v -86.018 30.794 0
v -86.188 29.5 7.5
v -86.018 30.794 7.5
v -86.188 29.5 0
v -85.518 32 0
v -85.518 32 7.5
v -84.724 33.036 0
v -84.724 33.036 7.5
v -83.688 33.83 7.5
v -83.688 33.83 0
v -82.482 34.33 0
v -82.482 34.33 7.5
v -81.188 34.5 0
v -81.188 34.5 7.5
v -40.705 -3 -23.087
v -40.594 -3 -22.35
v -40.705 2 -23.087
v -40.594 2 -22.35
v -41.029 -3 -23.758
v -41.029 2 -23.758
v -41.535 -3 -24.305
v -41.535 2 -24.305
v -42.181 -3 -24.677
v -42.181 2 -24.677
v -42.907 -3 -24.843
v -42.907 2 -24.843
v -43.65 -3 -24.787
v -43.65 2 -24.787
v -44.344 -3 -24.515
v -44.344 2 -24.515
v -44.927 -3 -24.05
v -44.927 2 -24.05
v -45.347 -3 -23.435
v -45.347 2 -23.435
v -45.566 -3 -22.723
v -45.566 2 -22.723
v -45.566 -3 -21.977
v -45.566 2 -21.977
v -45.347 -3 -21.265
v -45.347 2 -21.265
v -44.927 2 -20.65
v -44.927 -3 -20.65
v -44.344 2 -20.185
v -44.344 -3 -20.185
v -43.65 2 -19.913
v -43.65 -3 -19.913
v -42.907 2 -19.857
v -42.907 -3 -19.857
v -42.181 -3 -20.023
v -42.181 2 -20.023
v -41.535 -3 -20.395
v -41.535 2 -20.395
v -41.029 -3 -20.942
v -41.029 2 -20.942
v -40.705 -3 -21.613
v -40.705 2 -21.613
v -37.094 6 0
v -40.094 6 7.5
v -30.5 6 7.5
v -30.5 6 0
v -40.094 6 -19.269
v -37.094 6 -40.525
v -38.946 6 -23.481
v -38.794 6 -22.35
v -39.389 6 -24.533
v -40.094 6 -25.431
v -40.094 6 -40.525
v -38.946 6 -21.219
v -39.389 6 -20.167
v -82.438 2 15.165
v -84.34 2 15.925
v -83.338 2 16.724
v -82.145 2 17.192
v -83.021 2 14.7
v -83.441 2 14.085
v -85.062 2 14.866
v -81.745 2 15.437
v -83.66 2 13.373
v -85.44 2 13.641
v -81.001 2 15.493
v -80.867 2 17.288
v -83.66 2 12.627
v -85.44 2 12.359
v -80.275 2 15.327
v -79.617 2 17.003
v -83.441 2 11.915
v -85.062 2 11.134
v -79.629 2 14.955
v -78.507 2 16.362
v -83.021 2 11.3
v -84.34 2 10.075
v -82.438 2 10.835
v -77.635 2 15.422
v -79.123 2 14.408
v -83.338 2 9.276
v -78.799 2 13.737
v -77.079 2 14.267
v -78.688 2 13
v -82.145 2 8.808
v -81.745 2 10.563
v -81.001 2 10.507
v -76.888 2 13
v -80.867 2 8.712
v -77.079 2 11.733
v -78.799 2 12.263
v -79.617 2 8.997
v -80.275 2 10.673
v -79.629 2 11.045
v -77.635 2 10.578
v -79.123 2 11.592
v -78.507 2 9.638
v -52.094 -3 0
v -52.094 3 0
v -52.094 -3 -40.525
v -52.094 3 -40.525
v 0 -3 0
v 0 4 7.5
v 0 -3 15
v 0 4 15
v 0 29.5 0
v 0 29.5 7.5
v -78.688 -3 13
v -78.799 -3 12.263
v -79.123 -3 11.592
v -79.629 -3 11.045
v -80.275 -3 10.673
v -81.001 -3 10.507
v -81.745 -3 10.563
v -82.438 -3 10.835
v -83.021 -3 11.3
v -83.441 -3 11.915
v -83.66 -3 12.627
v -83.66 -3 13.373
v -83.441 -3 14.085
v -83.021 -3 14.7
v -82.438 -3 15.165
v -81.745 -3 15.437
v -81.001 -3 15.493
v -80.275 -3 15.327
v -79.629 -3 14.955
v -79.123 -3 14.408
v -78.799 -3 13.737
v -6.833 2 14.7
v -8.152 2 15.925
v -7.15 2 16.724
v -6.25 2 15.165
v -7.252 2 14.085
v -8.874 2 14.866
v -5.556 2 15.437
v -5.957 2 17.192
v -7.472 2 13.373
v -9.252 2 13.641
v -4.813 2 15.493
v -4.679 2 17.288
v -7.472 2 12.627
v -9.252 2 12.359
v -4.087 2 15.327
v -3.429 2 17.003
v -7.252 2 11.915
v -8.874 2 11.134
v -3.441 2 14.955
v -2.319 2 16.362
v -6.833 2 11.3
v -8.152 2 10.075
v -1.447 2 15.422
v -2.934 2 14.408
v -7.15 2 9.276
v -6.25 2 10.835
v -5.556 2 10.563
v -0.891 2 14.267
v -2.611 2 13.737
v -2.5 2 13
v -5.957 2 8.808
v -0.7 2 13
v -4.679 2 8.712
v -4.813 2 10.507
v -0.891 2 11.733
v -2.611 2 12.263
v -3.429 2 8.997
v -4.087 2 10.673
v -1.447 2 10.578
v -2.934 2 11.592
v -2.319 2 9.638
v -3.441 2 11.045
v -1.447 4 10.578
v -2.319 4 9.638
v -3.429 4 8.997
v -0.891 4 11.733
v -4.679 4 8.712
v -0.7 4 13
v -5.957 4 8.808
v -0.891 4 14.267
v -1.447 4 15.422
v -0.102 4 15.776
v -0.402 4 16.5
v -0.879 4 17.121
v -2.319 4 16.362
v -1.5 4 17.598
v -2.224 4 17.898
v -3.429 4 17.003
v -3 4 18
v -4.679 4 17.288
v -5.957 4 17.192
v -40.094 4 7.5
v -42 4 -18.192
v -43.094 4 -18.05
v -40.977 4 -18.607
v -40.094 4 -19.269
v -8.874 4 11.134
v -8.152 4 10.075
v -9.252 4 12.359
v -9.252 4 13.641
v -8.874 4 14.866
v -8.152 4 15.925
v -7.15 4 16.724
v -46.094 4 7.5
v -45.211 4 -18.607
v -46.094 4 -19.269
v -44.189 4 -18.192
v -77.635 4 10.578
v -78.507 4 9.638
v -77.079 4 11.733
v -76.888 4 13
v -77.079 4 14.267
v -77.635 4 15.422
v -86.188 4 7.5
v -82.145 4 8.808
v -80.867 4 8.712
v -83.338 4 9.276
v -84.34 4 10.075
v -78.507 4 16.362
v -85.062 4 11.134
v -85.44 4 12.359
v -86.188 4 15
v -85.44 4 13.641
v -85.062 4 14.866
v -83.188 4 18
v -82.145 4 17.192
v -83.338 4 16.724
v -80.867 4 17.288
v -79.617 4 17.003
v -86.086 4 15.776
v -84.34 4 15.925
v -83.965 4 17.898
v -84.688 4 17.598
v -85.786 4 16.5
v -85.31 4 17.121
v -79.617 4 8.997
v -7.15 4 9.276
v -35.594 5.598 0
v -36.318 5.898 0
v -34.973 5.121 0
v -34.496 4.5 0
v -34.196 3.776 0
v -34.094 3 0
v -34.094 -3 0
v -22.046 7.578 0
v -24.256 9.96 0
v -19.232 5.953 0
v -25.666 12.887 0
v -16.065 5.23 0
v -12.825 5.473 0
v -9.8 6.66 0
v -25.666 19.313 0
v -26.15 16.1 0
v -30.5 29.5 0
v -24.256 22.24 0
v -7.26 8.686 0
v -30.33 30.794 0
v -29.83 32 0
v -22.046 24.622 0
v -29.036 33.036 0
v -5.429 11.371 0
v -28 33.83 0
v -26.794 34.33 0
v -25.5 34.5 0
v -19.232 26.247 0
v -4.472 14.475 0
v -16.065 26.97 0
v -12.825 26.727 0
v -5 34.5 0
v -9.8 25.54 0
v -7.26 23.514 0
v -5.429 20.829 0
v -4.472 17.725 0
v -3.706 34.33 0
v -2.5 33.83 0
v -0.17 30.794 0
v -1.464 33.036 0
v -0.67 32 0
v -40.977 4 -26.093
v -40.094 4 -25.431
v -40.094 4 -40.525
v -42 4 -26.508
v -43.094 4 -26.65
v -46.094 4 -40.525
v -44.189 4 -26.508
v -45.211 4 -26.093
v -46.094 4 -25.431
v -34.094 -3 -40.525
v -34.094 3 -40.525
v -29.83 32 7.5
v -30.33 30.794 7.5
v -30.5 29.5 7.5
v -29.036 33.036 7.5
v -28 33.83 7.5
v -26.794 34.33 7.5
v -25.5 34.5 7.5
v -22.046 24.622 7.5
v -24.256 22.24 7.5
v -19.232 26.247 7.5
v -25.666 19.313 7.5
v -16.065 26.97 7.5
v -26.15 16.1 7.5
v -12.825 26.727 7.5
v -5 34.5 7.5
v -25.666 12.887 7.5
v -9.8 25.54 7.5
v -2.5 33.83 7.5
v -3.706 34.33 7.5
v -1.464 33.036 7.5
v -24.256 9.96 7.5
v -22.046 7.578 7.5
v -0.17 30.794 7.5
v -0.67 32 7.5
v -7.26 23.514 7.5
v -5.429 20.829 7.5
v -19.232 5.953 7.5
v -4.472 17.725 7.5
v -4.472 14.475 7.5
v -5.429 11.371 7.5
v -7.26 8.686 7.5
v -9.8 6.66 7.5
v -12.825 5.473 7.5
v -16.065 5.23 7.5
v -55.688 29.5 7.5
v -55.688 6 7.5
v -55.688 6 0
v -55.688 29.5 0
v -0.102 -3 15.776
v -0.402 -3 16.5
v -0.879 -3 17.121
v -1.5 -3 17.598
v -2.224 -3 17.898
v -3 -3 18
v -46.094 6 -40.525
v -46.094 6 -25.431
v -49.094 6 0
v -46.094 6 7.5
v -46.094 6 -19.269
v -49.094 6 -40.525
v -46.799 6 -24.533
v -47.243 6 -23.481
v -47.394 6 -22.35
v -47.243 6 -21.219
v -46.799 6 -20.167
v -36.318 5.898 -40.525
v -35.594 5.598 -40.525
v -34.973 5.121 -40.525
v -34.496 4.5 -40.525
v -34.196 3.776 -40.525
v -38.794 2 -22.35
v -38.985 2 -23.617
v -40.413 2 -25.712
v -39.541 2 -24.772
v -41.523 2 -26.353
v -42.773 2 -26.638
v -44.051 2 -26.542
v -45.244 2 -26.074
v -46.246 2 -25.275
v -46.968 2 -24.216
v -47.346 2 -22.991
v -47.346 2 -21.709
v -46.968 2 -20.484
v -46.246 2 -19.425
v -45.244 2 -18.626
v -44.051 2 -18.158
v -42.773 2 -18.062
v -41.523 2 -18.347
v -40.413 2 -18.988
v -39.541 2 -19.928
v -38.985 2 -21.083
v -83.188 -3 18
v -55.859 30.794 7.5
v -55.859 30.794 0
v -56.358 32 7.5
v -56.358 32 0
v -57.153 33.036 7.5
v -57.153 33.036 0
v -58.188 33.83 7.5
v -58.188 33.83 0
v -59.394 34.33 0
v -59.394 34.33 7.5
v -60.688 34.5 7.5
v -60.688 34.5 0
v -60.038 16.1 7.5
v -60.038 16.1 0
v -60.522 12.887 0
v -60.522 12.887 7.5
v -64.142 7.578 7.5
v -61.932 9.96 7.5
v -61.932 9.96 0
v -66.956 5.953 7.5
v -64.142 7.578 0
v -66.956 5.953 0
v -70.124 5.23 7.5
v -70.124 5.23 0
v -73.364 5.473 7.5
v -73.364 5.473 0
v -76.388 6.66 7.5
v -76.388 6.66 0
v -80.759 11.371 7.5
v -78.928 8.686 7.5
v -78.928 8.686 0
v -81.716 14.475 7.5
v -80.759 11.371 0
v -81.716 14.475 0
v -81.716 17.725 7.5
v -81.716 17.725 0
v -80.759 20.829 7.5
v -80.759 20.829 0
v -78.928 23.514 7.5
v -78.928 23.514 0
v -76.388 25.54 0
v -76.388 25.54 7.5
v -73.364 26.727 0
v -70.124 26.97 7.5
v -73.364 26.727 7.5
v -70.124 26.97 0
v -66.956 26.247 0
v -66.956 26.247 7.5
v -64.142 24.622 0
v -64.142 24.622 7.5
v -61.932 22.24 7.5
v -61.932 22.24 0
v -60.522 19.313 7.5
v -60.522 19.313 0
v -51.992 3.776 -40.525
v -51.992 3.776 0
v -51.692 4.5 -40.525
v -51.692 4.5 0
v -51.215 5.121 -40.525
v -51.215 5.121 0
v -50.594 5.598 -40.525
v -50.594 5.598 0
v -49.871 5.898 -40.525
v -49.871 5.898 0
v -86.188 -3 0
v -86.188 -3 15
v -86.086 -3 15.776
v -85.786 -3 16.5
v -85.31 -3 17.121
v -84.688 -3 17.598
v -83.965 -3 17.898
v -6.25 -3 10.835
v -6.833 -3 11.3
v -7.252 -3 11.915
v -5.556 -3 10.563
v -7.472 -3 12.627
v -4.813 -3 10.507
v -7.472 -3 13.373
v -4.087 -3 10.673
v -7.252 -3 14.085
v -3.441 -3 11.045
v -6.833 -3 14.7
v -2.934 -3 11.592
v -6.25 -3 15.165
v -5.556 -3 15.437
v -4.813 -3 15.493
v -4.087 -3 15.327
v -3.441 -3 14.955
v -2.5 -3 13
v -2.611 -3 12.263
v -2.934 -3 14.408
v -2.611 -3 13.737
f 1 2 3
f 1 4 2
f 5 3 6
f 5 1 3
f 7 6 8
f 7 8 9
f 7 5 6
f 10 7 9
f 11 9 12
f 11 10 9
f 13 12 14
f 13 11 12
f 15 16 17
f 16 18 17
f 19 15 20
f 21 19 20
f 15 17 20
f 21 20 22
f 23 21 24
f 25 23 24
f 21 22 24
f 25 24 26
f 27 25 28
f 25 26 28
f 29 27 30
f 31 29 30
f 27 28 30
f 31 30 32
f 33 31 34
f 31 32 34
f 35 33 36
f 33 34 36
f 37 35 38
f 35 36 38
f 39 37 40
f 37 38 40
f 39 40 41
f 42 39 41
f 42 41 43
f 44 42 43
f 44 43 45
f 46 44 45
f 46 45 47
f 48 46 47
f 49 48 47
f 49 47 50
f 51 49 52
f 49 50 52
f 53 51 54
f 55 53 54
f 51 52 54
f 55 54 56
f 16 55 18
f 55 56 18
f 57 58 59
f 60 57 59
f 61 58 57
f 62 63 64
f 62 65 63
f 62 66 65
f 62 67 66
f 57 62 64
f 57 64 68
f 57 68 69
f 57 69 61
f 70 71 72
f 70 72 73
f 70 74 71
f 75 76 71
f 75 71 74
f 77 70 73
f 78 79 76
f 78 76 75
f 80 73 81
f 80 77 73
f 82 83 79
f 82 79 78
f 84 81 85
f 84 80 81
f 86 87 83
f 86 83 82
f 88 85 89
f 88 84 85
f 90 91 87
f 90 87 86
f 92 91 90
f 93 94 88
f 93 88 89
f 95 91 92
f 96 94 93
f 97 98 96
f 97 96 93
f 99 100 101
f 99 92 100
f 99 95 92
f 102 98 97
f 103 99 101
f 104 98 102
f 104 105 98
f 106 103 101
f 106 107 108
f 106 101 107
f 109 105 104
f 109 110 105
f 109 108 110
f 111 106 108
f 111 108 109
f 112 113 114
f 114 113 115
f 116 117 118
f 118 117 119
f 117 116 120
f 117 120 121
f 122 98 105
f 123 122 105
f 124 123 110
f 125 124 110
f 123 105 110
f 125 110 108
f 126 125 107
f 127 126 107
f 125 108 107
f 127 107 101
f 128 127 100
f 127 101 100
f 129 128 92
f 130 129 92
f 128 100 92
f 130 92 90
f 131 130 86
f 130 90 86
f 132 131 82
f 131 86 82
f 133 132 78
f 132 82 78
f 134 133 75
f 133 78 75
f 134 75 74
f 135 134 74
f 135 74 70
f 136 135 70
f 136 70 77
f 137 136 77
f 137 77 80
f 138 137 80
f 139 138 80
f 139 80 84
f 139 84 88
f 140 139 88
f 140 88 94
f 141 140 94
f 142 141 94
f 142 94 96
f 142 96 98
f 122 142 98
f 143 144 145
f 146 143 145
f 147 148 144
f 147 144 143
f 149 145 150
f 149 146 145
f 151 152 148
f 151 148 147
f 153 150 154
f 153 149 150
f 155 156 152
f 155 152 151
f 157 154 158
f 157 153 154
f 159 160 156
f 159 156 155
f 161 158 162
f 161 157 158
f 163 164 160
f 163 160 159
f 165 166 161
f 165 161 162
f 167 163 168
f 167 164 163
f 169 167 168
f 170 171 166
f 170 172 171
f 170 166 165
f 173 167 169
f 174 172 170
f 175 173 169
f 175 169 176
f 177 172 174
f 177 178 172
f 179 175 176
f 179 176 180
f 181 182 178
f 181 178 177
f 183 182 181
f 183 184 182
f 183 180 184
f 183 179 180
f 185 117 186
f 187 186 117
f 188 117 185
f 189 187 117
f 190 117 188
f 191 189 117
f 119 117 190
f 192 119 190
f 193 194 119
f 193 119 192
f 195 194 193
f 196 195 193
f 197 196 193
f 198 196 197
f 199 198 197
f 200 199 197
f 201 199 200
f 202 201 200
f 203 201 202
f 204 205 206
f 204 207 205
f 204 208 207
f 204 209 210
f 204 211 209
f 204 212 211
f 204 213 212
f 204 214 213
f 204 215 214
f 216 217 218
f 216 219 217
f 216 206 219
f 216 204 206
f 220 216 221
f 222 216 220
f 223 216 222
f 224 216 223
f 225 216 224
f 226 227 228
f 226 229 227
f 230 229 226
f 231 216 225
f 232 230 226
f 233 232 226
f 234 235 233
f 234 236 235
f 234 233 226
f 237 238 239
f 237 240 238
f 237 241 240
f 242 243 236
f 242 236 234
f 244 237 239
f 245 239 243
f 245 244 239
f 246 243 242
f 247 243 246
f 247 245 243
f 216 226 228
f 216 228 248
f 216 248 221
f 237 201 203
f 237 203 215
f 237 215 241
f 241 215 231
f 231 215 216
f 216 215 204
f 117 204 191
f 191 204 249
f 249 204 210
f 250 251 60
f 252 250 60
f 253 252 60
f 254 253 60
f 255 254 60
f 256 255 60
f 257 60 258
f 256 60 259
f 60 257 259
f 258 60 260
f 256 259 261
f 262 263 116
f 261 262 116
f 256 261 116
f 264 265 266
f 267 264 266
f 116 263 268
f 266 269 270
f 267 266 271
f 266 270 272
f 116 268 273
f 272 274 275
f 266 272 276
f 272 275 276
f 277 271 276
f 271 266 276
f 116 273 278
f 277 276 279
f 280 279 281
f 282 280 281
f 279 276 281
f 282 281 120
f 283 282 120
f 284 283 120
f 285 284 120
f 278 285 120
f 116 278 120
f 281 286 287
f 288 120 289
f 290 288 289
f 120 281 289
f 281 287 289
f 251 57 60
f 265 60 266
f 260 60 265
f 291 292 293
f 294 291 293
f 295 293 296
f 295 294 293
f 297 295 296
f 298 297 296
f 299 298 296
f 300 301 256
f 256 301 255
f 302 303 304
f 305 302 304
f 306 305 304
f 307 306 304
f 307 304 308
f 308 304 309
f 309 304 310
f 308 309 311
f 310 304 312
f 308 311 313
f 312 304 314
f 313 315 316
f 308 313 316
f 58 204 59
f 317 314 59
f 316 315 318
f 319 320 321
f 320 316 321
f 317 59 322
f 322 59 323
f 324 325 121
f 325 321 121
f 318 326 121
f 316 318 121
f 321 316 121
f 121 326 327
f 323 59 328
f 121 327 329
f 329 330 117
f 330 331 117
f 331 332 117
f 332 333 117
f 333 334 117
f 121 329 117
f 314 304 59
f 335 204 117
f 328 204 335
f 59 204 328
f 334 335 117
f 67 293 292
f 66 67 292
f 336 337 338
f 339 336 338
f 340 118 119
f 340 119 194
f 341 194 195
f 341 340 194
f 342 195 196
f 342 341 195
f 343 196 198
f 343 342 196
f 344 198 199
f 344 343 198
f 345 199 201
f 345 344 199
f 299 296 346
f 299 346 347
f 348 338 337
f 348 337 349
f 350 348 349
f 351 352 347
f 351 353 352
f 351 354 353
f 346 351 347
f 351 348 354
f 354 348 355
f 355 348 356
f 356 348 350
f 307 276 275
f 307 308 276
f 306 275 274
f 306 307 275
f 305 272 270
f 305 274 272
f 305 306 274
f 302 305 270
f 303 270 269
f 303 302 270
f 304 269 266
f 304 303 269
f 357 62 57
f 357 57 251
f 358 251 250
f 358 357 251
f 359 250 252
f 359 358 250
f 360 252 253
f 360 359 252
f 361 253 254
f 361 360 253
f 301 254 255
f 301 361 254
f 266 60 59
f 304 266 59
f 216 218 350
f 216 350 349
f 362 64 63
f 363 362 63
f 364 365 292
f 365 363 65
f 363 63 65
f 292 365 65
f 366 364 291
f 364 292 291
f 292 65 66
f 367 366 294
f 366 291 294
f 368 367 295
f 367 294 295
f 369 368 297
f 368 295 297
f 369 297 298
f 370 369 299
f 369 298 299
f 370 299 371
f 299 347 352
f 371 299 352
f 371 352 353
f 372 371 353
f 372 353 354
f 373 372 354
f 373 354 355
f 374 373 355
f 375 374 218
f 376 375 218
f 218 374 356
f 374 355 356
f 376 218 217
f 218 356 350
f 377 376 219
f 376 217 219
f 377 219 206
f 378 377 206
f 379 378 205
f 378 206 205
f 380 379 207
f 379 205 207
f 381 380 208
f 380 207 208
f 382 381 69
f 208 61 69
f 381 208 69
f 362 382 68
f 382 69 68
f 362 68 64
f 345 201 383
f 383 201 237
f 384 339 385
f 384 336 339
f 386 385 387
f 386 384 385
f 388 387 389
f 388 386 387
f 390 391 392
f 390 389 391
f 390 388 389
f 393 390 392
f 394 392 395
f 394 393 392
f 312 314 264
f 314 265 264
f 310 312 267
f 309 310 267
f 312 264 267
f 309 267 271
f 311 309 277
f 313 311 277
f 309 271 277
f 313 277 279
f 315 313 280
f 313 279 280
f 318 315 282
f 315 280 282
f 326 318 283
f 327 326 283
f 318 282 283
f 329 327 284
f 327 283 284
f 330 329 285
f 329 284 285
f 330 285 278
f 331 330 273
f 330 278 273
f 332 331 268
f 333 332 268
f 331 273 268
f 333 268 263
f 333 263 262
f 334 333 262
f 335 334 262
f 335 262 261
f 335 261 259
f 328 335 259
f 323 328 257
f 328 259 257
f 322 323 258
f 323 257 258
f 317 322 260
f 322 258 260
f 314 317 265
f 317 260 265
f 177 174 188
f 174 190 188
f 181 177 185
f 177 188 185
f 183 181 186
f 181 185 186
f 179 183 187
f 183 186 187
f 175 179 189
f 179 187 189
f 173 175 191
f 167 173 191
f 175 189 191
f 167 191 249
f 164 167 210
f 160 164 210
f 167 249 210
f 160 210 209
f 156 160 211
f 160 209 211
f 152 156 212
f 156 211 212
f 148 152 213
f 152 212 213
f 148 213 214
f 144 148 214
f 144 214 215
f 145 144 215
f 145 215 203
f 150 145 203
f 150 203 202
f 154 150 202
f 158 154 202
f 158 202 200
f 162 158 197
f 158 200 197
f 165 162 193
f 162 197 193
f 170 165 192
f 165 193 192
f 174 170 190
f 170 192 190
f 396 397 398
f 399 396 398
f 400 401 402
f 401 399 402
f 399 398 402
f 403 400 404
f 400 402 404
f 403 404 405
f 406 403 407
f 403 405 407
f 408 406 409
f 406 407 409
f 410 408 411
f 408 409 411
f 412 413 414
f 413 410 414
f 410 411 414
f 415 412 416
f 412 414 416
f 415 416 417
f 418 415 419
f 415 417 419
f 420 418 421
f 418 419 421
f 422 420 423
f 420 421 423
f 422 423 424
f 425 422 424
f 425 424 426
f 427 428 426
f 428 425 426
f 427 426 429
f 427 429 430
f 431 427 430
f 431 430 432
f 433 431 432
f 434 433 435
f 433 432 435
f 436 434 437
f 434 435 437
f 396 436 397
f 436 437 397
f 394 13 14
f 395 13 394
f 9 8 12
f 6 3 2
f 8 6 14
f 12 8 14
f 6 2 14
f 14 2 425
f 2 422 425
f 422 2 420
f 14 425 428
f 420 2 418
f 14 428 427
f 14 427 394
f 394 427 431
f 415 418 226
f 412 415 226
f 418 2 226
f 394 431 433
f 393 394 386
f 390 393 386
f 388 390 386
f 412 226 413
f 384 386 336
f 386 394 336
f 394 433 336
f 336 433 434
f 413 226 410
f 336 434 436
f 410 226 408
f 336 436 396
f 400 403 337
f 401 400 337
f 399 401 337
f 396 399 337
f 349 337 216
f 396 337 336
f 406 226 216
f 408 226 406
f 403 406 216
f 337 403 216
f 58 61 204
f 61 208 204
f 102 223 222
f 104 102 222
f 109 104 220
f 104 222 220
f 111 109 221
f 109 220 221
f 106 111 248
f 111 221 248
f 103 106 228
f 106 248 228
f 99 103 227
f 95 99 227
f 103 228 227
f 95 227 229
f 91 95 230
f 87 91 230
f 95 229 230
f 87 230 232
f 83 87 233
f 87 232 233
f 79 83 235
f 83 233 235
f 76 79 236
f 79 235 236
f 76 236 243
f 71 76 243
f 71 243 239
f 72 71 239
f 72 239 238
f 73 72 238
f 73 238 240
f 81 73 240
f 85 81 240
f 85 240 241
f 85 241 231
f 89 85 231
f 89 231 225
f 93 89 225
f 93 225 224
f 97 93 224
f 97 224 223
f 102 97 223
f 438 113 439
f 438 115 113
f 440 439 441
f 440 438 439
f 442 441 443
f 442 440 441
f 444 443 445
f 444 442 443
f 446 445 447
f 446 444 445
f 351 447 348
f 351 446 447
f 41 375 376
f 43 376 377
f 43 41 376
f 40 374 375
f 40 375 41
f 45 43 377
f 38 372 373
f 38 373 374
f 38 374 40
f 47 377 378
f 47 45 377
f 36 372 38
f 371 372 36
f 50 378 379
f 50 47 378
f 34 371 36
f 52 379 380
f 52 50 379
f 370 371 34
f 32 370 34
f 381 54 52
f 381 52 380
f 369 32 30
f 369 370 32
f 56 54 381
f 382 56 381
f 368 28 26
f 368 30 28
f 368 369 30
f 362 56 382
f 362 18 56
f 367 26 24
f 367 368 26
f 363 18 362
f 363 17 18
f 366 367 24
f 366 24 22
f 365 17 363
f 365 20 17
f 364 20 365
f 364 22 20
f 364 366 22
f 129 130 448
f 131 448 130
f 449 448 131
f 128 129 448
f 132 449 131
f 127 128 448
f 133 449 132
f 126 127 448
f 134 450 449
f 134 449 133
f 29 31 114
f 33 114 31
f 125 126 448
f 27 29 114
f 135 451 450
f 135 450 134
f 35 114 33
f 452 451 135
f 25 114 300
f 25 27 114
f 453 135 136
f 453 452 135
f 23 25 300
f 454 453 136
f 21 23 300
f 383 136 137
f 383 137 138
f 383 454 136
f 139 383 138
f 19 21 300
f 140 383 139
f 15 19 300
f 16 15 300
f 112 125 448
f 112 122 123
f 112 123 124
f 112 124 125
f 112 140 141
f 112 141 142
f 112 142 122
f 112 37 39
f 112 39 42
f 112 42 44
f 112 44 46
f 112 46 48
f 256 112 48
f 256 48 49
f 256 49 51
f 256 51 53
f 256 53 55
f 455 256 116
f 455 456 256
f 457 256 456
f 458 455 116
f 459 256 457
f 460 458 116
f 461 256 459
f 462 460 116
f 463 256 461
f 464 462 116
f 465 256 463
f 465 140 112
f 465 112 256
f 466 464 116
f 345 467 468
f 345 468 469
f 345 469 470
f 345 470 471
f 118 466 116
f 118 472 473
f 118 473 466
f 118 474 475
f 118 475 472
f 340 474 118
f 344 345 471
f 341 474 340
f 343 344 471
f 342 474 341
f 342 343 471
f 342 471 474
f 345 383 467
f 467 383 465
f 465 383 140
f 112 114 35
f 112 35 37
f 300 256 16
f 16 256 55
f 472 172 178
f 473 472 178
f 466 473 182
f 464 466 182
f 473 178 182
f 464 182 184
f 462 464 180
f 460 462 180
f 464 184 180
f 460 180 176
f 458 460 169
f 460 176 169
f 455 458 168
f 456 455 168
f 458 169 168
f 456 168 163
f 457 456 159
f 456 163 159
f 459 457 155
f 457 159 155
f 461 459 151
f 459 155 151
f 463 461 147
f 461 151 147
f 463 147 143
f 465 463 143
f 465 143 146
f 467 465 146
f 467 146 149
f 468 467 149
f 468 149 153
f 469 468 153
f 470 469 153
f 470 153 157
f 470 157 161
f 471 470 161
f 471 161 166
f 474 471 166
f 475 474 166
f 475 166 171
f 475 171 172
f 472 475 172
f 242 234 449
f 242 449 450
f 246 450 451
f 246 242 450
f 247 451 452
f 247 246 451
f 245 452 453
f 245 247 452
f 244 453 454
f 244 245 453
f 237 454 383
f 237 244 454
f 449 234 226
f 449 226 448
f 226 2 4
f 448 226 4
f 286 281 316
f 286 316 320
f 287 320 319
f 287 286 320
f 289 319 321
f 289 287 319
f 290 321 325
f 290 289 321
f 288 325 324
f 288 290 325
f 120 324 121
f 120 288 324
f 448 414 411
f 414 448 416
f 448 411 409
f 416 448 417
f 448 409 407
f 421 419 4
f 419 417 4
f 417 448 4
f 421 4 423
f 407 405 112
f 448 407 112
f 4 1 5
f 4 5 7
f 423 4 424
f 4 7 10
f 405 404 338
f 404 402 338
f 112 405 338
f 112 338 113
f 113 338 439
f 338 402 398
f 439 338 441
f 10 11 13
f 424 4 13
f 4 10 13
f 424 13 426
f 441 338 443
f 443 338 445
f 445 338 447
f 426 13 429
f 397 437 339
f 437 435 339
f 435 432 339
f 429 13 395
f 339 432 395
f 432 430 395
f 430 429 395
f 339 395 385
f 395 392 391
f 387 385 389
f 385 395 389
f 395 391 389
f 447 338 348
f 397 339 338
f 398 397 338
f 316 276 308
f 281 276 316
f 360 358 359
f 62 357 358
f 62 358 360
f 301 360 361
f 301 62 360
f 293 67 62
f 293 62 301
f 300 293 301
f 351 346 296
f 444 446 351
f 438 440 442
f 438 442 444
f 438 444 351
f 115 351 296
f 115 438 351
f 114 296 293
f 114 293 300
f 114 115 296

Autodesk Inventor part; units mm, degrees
ref_plane "YZ Plane" through (0, 0, 0) normal (1, 0, 0) x (0, 1, 0)
ref_plane "XZ Plane" through (0, 0, 0) normal (0, 1, 0) x (-1, 0, 0)
sketch "Boceto1" plane through (0, 0, 0) normal (0, 1, 0) x (-1, 0, 0)
  line L0 (0, 0) -> (0, 18)
  line L1 (0, 18) -> (43.0941, 18)
  line L2 (43.0941, 18) -> (43.0941, -103.05)
  line L3 (43.0941, -103.05) -> (0, -103.05)
  line L4 (0, -103.05) -> (0, -81.05)
  line L5 (0, -81.05) -> (34.0941, -81.05)
  line L6 (34.0941, -81.05) -> (34.0941, 0)
  line L7 (34.0941, 0) -> (0, 0)
  dimension "acople_hombro_largo_agujero" = 81.05
  dimension "d1" = 9
  dimension "acople_hombro_grosor_trasero" = 18
  dimension "acople_hombro_ancho_agujero" = 34.0941
  dimension "acople_hombro_grosor_frontal" = 22
extrude "Extrusión1" add sketch "Boceto1" along normal blind 4
sketch "Boceto2" plane through (0, 4, 0) normal (0, 1, 0) x (1, 0, 0)
  line L0 (0, -18) -> (0, 0) projected
  line L1 (0, 0) -> (-30.5, 0)
  line L2 (-30.5, 0) -> (-30.5, -7.5)
  line L3 (-30.5, -7.5) -> (0, -7.5)
  line L4 (0, -7.5) -> (0, 0)
  point P0 (0, 81.05)
  dimension "d6" = 30.5
  dimension "grosor_seccion_agujero_circular" = 7.5
sketch "Boceto3" plane through (0, 4, 0) normal (0, 1, 0) x (1, 0, 0)
  line L0 (0, 81.05) -> (-30.5, 81.05)
  line L1 (-30.5, 81.05) -> (-30.5, 96.05)
  line L2 (-30.5, 96.05) -> (0, 96.05)
  line L3 (0, 96.05) -> (0, 81.05)
  line L4 (-30.5, 0) -> (-30.5, -7.5) projected
  point P0 (0, 0)
  dimension "grosor_sección_agujero_servo" = 15
  dimension "d21" = 30.5
extrude "Extrusión2" add sketch "Boceto3" along normal blind 50.5
sketch "Boceto4" plane through (-34.0941, 0, -81.05) normal (0, 0, 1) x (1, 0, 0)
  line L0 (8.5941, 46.5) -> (29.0941, 46.5)
  line L1 (29.0941, 46.5) -> (29.0941, 6)
  line L2 (29.0941, 6) -> (8.5941, 6)
  line L3 (8.5941, 6) -> (8.5941, 46.5)
  line L4 (34.0941, 0) -> (0, 0) projected
  line L5 (34.0941, 0) -> (34.0941, 54.5) projected
  line L6 (3.5941, 54.5) -> (34.0941, 54.5) projected
  line L7 (3.5941, 4) -> (3.5941, 54.5) projected
  line L8 (0, 0) -> (0, 4) projected
  circle A0 centre (13.5941, 2.05) radius 1
  circle A1 centre (24.0941, 2.05) radius 1
  circle A2 centre (13.5941, 50.45) radius 1
  circle A3 centre (24.0941, 50.45) radius 1
  line L9 (0, 4) -> (3.5941, 4) projected
  point P0 (34.0941, 0)
  dimension "d12" = 40.5
  dimension "d13" = 20.5
  dimension "d14" = 2
  dimension "d15" = 3.95
  dimension "d16" = 3.95
  dimension "d17" = 5
  dimension "d18" = 5
  dimension "d19" = 2.05
  dimension "d20" = 5
  dimension "d22" = 30.5
  dimension "d23" = 54.5
  dimension "d24" = 48.4
sketch "Boceto5" plane through (-34.0941, 0, -81.05) normal (0, 0, 1) x (1, 0, 0)
  circle A0 centre (13.5941, 50.45) radius 1 projected
  circle A1 centre (24.0941, 50.45) radius 1 projected
  circle A2 centre (13.5941, 2.05) radius 1 projected
  circle A3 centre (24.0941, 2.05) radius 1 projected
  point P0 (34.0941, 0)
extrude "Extrusión3" cut sketch "Boceto4" against normal up to surface (15 mm away) contours L0 L1 L2 L3
extrude "Extrusión4" cut sketch "Boceto5" against normal up to surface (15 mm away)
extrude "Extrusión5" add sketch "Boceto2" along normal blind 30.5
ref_plane "Plano de trabajo2" through (-25.5, 6, -88.55) normal (0, 1, 0) x (1, 0, 0)
sketch "Boceto6" plane through (0, 0, 0) normal (0, 0, -1) x (-1, 0, 0)
  circle A0 centre (15.25, 16.1) radius 10.9
  line L0 (0, 34.5) -> (30.5, 34.5) projected
  point P0 (0, 0)
  point P1 (0, 6)
  point P2 (15.25, 34.5)
  dimension "d31" = 10.1
  dimension "d32" = 21.8
extrude "Extrusión6" cut sketch "Boceto6" against normal up to surface (7.5 mm away)
sketch "Boceto7" plane through (0, 4, -96.05) normal (0, 0, -1) x (-1, 0, 0)
  line L0 (0, 0) -> (43.0941, 0) projected
  line L1 (30.5, 0) -> (30.5, 50.5) projected
  line L2 (0, 0) -> (30.5, 0)
  line L3 (30.5, 0) -> (30.5, 2)
  line L4 (30.5, 2) -> (0, 2)
  line L5 (0, 2) -> (0, 0)
  line L6 (25.5, 2) -> (5, 2) projected
  point P0 (0, -4)
extrude "Extrusión7" add sketch "Boceto7" along normal up to surface (7 mm away)
sketch "Sketch13" plane through (0, 0, 0) normal (0, -1, 0) x (1, 0, 0)
  line L0 (0, 0) -> (0, 18) projected
  line L1 (0, 18) -> (-43.0941, 18) projected
  line L2 (-43.0941, 18) -> (-43.0941, -103.05) projected
  line L3 (-43.0941, -103.05) -> (0, -103.05) projected
  line L4 (0, -103.05) -> (0, -81.05) projected
  line L5 (0, -81.05) -> (-34.0941, -81.05) projected
  line L6 (-34.0941, -81.05) -> (-34.0941, 0) projected
  line L7 (-34.0941, 0) -> (0, 0) projected
extrude "Extrusion14" add sketch "Sketch13" along normal blind 3
mirror "Mirror2" about plane through (-43.0941, 0, -103.05) normal (-1, 0, 0) of "Extrusión1", "Extrusión2", "Extrusión3", "Extrusión4", "Extrusión5", "Extrusión6", "Extrusión7", "Extrusion14"
sketch "Sketch14" plane through (0, 4, 0) normal (0, 1, 0) x (1, 0, 0)
  line L0 (-30.5, 96.05) -> (-30.5, 103.05) projected
  line L1 (-30.5, 81.05) -> (-30.5, 103.05)
  line L2 (-55.6882, 96.05) -> (-55.6882, 103.05) projected
  line L3 (-30.5, 103.05) -> (-55.6882, 103.05)
  line L4 (-55.6882, 103.05) -> (-55.6882, 81.05)
  line L5 (-86.1882, 81.05) -> (-52.0941, 81.05) projected
  line L6 (-52.0941, 0) -> (-52.0941, 81.05) projected
  line L7 (-52.0941, 81.05) -> (-52.0941, 0)
  line L8 (-52.0941, 0) -> (-46.0941, 0)
  line L9 (-46.0941, 91.05) -> (-40.0941, 91.05)
  line L10 (-34.0941, 0) -> (-34.0941, 81.05)
  line L11 (-34.0941, 81.05) -> (-30.5, 81.05)
  line L12 (0, 81.05) -> (-34.0941, 81.05) projected
  line L13 (-34.0941, 0) -> (-34.0941, 81.05) projected
  line L14 (-30.5, 0) -> (-34.0941, 0) projected
  line L15 (-34.0941, 0) -> (-30.5, 0)
  line L16 (-30.5, -7.5) -> (-30.5, 0) projected
  line L17 (-30.5, 0) -> (-30.5, -7.5)
  line L18 (-30.5, -7.5) -> (-40.0941, -7.5)
  line L19 (-40.0941, 91.05) -> (-40.0941, -7.5)
  line L20 (-52.0941, 0) -> (-55.6882, 0)
  line L21 (-52.0941, 0) -> (-86.1882, 0) projected
  line L22 (-55.6882, 0) -> (-55.6882, -7.5) projected
  line L23 (-55.6882, -7.5) -> (-46.0941, -7.5)
  line L24 (-46.0941, 91.05) -> (-46.0941, -7.5)
  line L25 (-55.6882, -7.5) -> (-86.1882, -7.5) projected
  line L26 (-55.6882, -7.5) -> (-55.6882, 0)
  point P0 (0, 0)
  dimension "d65" = 12
  dimension "d66" = 6
  dimension "d68" = 6
  dimension "d69" = 18
extrude "Extrusion15" add sketch "Sketch14" along normal up to surface (2 mm away)
sketch "Sketch15" plane through (0, 4, 0) normal (0, 1, 0) x (1, 0, 0)
  circle A0 centre (-5, -13) radius 2.5
  circle A1 centre (-43.0941, 62.7) radius 2.5
  circle A2 centre (-43.0941, 22.35) radius 2.5
  circle A3 centre (-81.1882, -13) radius 2.5
  line L0 (-46.0941, 91.05) -> (-40.0941, 91.05) projected
  line L1 (0, -18) -> (-86.1882, -18) projected
  line L2 (0, -18) -> (0, -7.5) projected
  line L3 (-86.1882, -18) -> (-86.1882, -7.5) projected
  line L4 (0, 103.05) -> (-86.1882, 103.05) projected
  line L5 (-86.1882, 0) -> (-55.6882, 0) projected
  point P0 (0, 0)
  point P1 (-43.0941, 91.05)
  point P2 (0, 101.05)
  point P3 (-86.1882, 101.05)
  point P4 (-86.1882, 103.05)
  dimension "diametro_tornillo" = 5
  dimension "d73" = 5
  dimension "dist_agujero_trasero_a_lado" = 5
  dimension "d76" = 5
  dimension "d77" = 121.05
  dimension "dist_agujero_central_a_frente" = 40.35
  dimension "d79" = 40.35
  dimension "dist_agujero_trasero_a_frente" = 13
extrude "Extrusion16" cut sketch "Sketch15" along normal mid plane 20
sketch "Sketch16" plane through (0, 4, 0) normal (0, 1, 0) x (1, 0, 0)
  circle A0 centre (-5, -13) radius 2.5 projected
  circle A1 centre (-81.1882, -13) radius 2.5 projected
  circle A2 centre (-81.1882, -13) radius 4.3
  circle A3 centre (-5, -13) radius 2.5 projected
  circle A4 centre (-5, -13) radius 4.3
  point P0 (0, 0)
  dimension "diametro_cabeza_tornillo" = 8.6
extrude "Extrusion17" cut sketch "Sketch16" against normal blind 2
sketch "Sketch17" plane through (-25.5, 6, -81.05) normal (0, 1, 0) x (1, 0, 0)
  circle A0 centre (-17.5941, -18.35) radius 2.5 projected
  circle A1 centre (-17.5941, -18.35) radius 4.3
  circle A2 centre (-17.5941, -58.7) radius 2.5 projected
  circle A3 centre (-17.5941, -58.7) radius 4.3
  circle A4 centre (20.5, -94.05) radius 2.5 projected
  circle A5 centre (20.5, -94.05) radius 4.3 projected
  point P0 (25.5, -81.05)
  dimension "d85" = 8.6
  dimension "d86" = 8.6
extrude "Extrusion18" cut sketch "Sketch17" against normal blind 4 contours A1 | A3
sketch "Sketch18" plane through (-25.5, 6, -81.05) normal (0, 1, 0) x (1, 0, 0)
  circle A0 centre (10.25, 14) radius 2.5
  circle A1 centre (-45.4382, 14) radius 2.5
  circle A2 centre (20.5, -94.05) radius 2.5 projected
  circle A3 centre (-17.5941, -58.7) radius 2.5 projected
  line L0 (20.5, 0) -> (0, 0) projected
  line L1 (25.5, 22) -> (25.5, 0) projected
  line L2 (-35.1882, 0) -> (-55.6882, 0) projected
  line L3 (25.5, 22) -> (-60.6882, 22) projected
  point P0 (25.5, -81.05)
  point P1 (10.25, 0)
  point P2 (-45.4382, 0)
  point P3 (-60.6882, 20)
  point P4 (-60.6882, 22)
  dimension "dist_agujero_frontal_a_frente" = 8
  dimension "dist_agujero_frontal_a_lateral" = 15.25
extrude "Extrusion19" cut sketch "Sketch18" against normal up to surface (9 mm away) contours A0 | A1
sketch "Sketch19" plane through (-25.5, 6, -81.05) normal (0, 1, 0) x (1, 0, 0)
  circle A0 centre (10.25, 14) radius 2.5 projected
  circle A1 centre (-45.4382, 14) radius 2.5 projected
  circle A2 centre (10.25, 14) radius 4.3
  circle A3 centre (-45.4382, 14) radius 4.3
  circle A4 centre (20.5, -94.05) radius 4.3 projected
  point P0 (25.5, -81.05)
  dimension "d91" = 8.6
  dimension "d98" = 8.6
extrude "Extrusion20" cut sketch "Sketch19" against normal blind 4.5 contours A2 | A3
fillet "Fillet3" radius 3 4 edges at (-86.1882, 1.5, -103.05) (-86.1882, 0.5, 18) (0, 0.5, 18) (0, 1.5, -103.05)
fillet "Fillet3" radius 5 8 edges at (-55.6882, 34.5, 3.75) (-86.1882, 34.5, 3.75) (-86.1882, 54.5, -88.55) (-55.6882, 54.5, -88.55) (-30.5, 54.5, -88.55) (0, 54.5, -88.55) (0, 34.5, 3.75) (-30.5, 34.5, 3.75)
fillet "Fillet3" radius 3 2 edges at (-34.0941, 6, -40.525) (-52.0941, 6, -40.525)
sketch "Sketch20" plane through (0, 4, 0) normal (0, 1, 0) x (1, 0, 0)
  line L0 (-86.1882, -15) -> (-86.1882, -7.5) projected
  line L1 (0, -15) -> (0, -7.5) projected
  line L2 (-3, -18) -> (-83.1882, -18) projected
  line L3 (-5, 0) -> (-25.5, 0) projected
  point P0 (0, 0)
  dimension "ancho_acople_hombros" = 86.188
sketch "Sketch21" plane through (0, -3, 0) normal (0, 0, -1) x (-1, 0, 0)
  line L0 (3, 0) -> (83.1882, 0) projected
  line L1 (5, 37.5) -> (25.5, 37.5) projected
  point P0 (0, 3)
  dimension "altura_acople_circular" = 37.5
ref_plane "Work Plane4" through (0, -3, -40.525) normal (0, 0, 1) x (1, 0, 0)
ref_plane "Work Plane3" through (0, -3, -81.05) normal (0, 0, 1) x (1, 0, 0)
split "Split1" plane through (0, -3, -40.525) removes the side toward (0, 0, -1)
equation "\"d6\" = d21"
equation "\"grosor_sección_agujero_servo\" = 2 * grosor_seccion_agujero_circular"
equation "\"d12\" = largo_servo"
equation "\"d13\" = ancho_servo"
equation "\"d16\" = d15"
equation "\"d18\" = d17"
equation "\"d19\" = -0.5 * d24 - 0.5 * d14 + 0.5 * d23"
equation "\"d20\" = -0.5 * ancho_servo + 0.5 * d22"
equation "\"d29\" = d6"
equation "\"d33\" = d6"
equation "\"d35\" = d6"
equation "\"d66\" = 0.333333 * d69"
equation "\"d68\" = d66"
equation "\"d76\" = dist_agujero_trasero_a_lado"
equation "\"dist_agujero_central_a_frente\" = 0.333333 * d77"
equation "\"d79\" = dist_agujero_central_a_frente"
equation "\"d86\" = d85"
equation "\"d91\" = d98"
equation "\"ancho_hombro\" = 61.05"
equation "\"d104\" = 0.5 * acople_hombro_largo_agujero"
equation "\"largo_servo\" = 40.5"
equation "\"ancho_servo\" = 20.5"
properties part number "Cuerpo - Acople Hombro"
